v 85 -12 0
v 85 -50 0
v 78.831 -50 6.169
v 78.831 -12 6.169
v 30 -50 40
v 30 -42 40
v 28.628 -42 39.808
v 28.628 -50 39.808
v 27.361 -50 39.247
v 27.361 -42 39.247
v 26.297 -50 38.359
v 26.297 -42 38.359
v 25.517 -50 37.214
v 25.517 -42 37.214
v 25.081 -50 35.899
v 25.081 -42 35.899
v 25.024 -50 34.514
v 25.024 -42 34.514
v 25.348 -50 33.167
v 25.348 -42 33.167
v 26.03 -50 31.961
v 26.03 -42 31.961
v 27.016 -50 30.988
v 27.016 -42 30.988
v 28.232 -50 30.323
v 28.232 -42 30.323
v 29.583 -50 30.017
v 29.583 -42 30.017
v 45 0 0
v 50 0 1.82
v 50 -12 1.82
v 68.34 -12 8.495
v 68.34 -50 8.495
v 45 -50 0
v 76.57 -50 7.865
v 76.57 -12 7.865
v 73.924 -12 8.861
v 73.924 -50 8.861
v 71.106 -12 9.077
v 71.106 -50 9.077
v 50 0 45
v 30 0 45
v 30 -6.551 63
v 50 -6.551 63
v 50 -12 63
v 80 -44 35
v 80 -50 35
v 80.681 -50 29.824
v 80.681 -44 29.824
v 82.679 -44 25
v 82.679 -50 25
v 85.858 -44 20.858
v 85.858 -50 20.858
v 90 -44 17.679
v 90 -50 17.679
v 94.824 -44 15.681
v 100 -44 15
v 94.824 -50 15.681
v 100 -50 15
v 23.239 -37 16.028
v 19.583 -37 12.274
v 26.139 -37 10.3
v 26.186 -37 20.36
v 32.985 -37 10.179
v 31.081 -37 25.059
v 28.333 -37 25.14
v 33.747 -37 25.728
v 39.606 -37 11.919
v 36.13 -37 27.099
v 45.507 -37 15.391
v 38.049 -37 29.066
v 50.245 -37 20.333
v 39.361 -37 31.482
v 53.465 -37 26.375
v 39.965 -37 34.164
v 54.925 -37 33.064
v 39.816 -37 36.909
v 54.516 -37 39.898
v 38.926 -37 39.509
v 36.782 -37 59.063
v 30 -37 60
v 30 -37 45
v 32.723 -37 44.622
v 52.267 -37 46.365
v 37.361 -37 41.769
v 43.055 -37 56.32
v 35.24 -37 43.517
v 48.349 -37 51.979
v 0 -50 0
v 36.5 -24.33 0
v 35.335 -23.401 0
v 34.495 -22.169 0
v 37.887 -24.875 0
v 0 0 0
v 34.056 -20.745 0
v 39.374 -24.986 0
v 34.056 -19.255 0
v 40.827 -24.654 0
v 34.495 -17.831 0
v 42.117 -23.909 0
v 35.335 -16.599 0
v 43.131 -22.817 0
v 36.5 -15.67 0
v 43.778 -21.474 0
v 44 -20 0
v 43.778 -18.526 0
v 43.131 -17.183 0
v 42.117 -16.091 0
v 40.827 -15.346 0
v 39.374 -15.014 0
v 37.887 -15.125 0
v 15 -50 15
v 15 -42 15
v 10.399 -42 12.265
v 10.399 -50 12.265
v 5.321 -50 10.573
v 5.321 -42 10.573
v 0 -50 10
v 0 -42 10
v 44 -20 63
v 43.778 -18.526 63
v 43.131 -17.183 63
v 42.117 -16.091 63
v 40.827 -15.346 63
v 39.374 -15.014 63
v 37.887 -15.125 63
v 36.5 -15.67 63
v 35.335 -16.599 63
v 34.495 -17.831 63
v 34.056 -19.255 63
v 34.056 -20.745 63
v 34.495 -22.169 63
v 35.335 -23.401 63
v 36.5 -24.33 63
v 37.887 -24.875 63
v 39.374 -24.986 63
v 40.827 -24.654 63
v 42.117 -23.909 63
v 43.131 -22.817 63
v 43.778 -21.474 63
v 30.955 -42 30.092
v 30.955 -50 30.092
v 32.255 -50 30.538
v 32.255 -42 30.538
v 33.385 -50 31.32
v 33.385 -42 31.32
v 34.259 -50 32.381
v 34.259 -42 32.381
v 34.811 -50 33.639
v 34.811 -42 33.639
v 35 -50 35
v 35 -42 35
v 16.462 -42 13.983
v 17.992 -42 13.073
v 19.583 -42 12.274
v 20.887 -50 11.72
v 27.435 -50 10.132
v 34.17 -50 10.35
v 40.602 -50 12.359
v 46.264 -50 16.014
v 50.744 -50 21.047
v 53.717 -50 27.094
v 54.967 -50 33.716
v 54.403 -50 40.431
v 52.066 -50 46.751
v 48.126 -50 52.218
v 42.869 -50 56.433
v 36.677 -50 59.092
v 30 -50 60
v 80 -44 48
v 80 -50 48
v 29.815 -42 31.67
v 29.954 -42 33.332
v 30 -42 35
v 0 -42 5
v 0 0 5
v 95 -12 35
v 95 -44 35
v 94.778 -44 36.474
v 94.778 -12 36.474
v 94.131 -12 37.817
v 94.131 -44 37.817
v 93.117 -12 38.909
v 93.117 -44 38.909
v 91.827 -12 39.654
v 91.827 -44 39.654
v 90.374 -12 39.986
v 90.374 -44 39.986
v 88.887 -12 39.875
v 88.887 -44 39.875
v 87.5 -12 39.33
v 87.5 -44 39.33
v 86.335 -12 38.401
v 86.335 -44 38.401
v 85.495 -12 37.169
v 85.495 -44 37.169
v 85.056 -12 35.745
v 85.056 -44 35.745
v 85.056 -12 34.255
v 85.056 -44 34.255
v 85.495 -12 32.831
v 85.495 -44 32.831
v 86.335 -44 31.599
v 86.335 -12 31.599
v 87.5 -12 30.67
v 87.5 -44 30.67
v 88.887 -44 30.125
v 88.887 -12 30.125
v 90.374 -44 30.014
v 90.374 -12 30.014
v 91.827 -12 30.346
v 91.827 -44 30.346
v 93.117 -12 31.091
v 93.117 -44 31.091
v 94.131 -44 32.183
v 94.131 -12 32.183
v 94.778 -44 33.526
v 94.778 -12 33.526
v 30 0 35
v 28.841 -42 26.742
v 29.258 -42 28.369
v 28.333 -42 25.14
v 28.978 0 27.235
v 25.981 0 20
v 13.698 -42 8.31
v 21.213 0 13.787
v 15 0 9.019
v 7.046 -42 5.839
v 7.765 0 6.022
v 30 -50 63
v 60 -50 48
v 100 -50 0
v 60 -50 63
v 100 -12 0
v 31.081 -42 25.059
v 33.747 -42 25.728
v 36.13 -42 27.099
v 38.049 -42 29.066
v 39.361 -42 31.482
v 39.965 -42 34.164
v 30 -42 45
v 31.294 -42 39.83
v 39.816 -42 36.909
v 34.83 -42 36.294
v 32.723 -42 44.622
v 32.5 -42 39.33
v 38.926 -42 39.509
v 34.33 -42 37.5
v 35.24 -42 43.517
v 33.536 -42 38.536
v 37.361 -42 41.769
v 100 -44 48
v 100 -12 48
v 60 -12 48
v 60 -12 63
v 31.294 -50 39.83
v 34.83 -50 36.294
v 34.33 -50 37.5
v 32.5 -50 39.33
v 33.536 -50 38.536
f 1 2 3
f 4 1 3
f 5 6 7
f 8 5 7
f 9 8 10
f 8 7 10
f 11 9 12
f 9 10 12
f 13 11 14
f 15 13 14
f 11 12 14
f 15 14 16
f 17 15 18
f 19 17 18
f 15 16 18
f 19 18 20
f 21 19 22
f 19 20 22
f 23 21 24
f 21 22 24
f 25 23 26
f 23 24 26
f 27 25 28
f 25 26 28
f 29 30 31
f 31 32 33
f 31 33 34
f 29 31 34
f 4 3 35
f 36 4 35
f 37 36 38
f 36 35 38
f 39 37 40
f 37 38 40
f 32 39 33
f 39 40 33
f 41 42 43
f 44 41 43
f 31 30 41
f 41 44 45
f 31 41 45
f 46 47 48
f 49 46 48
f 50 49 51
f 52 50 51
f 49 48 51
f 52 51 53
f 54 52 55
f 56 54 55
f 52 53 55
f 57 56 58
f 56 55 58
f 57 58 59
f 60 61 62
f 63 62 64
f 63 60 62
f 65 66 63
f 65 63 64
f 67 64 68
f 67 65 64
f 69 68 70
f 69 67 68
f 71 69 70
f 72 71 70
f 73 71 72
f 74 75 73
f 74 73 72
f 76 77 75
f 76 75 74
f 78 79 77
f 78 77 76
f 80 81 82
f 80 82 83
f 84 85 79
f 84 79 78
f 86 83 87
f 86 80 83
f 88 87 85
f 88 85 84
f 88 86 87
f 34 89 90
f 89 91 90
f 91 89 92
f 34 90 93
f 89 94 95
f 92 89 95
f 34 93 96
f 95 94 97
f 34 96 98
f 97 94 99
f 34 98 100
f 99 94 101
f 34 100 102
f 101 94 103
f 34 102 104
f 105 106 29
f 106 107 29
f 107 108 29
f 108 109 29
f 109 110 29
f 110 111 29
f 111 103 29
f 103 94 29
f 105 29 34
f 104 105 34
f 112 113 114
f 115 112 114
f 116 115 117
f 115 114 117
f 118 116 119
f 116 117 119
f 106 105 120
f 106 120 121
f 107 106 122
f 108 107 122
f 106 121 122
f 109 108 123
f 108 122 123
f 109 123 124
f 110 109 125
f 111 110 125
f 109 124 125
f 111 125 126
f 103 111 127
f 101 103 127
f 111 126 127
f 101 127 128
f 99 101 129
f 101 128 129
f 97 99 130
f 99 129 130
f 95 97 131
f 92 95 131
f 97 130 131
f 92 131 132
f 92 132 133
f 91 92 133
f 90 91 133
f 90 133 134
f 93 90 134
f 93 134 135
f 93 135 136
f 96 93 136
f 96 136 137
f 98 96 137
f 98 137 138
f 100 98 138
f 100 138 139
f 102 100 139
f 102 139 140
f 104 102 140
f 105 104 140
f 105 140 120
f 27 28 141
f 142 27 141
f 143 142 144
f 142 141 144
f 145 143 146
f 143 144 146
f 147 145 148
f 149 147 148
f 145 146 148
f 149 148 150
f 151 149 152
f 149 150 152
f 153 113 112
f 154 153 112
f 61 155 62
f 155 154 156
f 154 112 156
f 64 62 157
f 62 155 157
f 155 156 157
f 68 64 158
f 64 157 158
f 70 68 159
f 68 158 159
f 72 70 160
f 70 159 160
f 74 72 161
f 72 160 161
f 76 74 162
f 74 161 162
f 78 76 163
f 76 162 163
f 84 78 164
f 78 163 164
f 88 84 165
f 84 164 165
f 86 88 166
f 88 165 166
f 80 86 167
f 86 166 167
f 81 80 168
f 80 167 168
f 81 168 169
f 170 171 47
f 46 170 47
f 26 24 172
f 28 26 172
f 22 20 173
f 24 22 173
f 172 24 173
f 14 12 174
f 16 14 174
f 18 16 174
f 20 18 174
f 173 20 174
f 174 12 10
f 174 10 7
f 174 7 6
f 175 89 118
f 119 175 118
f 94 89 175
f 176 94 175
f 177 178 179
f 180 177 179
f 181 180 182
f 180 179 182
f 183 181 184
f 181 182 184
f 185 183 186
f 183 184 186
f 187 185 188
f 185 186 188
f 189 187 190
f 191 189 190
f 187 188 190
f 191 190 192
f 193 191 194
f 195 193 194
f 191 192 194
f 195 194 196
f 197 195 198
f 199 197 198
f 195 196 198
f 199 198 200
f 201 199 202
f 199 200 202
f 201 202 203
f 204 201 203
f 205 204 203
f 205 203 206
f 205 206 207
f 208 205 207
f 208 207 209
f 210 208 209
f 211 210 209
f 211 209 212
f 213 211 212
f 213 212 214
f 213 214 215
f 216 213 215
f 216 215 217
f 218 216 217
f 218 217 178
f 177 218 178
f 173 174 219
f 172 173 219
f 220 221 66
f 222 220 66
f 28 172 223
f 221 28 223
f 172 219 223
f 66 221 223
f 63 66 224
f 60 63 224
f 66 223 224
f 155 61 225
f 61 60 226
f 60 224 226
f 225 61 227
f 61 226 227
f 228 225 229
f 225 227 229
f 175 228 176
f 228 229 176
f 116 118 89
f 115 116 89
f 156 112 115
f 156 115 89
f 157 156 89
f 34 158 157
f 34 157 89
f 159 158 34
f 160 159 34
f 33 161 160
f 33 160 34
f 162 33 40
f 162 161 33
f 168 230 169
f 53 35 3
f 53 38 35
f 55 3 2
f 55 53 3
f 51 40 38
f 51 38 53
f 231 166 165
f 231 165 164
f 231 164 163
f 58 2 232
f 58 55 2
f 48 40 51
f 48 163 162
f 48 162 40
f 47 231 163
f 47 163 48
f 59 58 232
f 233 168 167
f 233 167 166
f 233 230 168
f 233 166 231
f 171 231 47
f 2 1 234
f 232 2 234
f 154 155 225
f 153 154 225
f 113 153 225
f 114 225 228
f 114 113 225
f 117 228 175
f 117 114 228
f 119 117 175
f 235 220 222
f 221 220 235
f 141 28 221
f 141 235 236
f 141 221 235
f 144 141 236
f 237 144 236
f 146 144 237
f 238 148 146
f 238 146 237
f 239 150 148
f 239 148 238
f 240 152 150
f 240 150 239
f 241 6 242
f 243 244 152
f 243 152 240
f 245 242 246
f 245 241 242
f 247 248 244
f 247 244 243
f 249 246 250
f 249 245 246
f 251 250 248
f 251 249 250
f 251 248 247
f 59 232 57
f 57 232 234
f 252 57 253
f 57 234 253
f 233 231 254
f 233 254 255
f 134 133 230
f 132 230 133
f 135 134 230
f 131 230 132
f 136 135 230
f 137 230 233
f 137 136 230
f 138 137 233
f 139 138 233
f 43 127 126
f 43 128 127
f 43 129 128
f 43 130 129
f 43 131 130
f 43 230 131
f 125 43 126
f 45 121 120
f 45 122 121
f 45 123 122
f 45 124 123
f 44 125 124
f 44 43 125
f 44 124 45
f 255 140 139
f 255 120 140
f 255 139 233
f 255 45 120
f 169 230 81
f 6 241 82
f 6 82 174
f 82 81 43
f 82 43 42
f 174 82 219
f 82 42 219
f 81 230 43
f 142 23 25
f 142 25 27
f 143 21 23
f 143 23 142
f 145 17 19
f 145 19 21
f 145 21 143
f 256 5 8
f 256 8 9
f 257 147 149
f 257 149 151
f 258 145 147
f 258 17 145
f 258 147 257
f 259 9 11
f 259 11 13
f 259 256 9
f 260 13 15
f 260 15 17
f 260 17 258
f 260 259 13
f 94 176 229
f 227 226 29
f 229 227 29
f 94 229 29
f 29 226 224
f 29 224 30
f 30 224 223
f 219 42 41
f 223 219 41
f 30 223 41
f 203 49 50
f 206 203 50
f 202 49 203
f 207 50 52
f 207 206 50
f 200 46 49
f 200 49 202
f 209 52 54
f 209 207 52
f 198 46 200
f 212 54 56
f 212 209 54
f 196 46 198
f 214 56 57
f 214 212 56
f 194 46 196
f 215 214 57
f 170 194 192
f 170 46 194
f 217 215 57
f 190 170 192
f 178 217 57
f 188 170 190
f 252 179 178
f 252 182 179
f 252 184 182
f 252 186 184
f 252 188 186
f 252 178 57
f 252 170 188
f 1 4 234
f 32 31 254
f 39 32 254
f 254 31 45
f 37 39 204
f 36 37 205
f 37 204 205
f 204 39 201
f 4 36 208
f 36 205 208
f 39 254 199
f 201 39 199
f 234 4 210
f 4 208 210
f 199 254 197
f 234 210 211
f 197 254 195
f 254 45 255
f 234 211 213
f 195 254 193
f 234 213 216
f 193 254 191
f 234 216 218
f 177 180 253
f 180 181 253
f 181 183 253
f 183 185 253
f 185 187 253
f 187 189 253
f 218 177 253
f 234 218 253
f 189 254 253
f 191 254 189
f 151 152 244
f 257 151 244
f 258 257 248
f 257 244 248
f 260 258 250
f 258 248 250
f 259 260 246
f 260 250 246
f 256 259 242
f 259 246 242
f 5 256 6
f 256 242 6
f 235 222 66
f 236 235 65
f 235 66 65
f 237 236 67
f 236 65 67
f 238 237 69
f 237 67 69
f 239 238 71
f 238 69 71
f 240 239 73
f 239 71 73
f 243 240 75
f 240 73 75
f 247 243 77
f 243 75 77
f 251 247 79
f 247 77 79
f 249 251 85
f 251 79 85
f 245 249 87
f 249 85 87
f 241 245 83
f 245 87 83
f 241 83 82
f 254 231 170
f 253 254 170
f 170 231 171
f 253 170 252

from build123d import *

# Parameters (mm, degrees)
F0_W      = 100
F0_H      = 63
F1_DEPTH  = 50
F2_W      = 40
F2_H      = 15
F3_DEPTH  = 50.001
F5_DEPTH  = 6
F6_R      = 5
F7_DEPTH  = 44.001
F8_R      = 25
F9_DEPTH  = 13
F10_R     = 10
F11_DEPTH = 5
F13_DEPTH = 42
F15_DEPTH = 50.001
F17_DEPTH = 8
F19_DEPTH = 63.001
F20_R     = 5
F21_DEPTH = 63.001
F23_DEPTH = 70.001


with BuildPart() as f1:
    # F0 (on Front) → F1 (new body)
    with BuildSketch(Plane.XZ):
        with Locations((50, 31.5)):
            Rectangle(F0_W, F0_H)
    extrude(amount=F1_DEPTH)

    # F2 (on face) → F3 (cut, through all)
    with BuildSketch(Plane.XZ.offset(50)):
        with Locations((80, 55.5)):
            Rectangle(F2_W, F2_H)
        with BuildLine():
            Line((45, 0), (85, 0))
            Line((85, 0), (78.8309201782, 6.1690798218))
            ThreePointArc((78.8309201782, 6.1690798218), (73.9242485057, 8.8609720811), (68.3396509331, 8.4949382178))
            Line((68.3396509331, 8.4949382178), (45, 0))
        make_face()
    extrude(amount=-F3_DEPTH, mode=Mode.SUBTRACT)

    # F4 (on face) → F5 (cut)
    with BuildSketch(Plane.XZ.offset(50)):
        with BuildLine():
            Line((100, 48), (84.8013158464, 48))
            ThreePointArc((84.8013158464, 48), (81.2386876382, 41.9291527956), (80, 35))
            Line((80, 35), (100, 35))
            Line((100, 35), (100, 48))
        make_face()
        with BuildLine():
            ThreePointArc((80, 35), (81.2386876382, 41.9291527956), (84.8013158464, 48))
            Line((84.8013158464, 48), (80, 48))
            Line((80, 48), (80, 35))
        make_face()
        with BuildLine():
            ThreePointArc((80, 35), (85.8578643763, 20.8578643763), (100, 15))
            Line((100, 15), (100, 35))
            Line((100, 35), (80, 35))
        make_face()
    extrude(amount=-F5_DEPTH, mode=Mode.SUBTRACT)

    # F6 (on face) → F7 (cut, through all)
    with BuildSketch(Plane.XZ.offset(44)):
        with Locations((90, 35)):
            Circle(F6_R)
    extrude(amount=-F7_DEPTH, mode=Mode.SUBTRACT)

    # F8 (on face) → F9 (cut)
    with BuildSketch(Plane.XZ.offset(50)):
        with Locations((30, 35)):
            Circle(F8_R)
    extrude(amount=-F9_DEPTH, mode=Mode.SUBTRACT)

    # F10 (on face) → F11 (join)
    with BuildSketch(Plane.XZ.offset(37)):
        with Locations((30, 35)):
            Circle(F10_R)
    extrude(amount=F11_DEPTH)

    # F12 (on face) → F13 (cut)
    with BuildSketch(Plane(origin=(0, 0, 0), x_dir=(-1, 0, 0), z_dir=(0, 1, 0))):
        with BuildLine():
            ThreePointArc((-30, 35), (-24.7296369608, 51.9836702684), (-10.7703296143, 63))
            Line((-10.7703296143, 63), (-30, 63))
            Line((-30, 63), (-30, 35))
        make_face()
        with BuildLine():
            Line((0, 63), (-10.7703296143, 63))
            ThreePointArc((-10.7703296143, 63), (-24.7296369608, 51.9836702684), (-30, 35))
            Line((-30, 35), (0, 35))
            Line((0, 35), (0, 63))
        make_face()
        with BuildLine():
            ThreePointArc((-30, 35), (-21.2132034356, 13.7867965644), (0, 5))
            Line((0, 5), (0, 35))
            Line((0, 35), (-30, 35))
        make_face()
    extrude(amount=-F13_DEPTH, mode=Mode.SUBTRACT)

    # F14 (on face) → F15 (cut, through all)
    with BuildSketch(Plane(origin=(0, 0, 0), x_dir=(-1, 0, 0), z_dir=(0, 1, 0))):
        with BuildLine():
            ThreePointArc((0, 10), (17.6776695297, 17.3223304703), (25, 35))
            ThreePointArc((25, 35), (17.6776695297, 52.6776695297), (0, 60))
            Line((0, 60), (0, 35))
            Line((0, 35), (0, 10))
        make_face()
        with BuildLine():
            Line((0, 35), (0, 60))
            ThreePointArc((0, 60), (-17.6776695297, 52.6776695297), (-25, 35))
            Line((-25, 35), (0, 35))
        make_face()
        with BuildLine():
            ThreePointArc((-25, 35), (-17.6776695297, 52.6776695297), (0, 60))
            Line((0, 60), (0, 63))
            Line((0, 63), (-30, 63))
            Line((-30, 63), (-30, 35))
            Line((-30, 35), (-25, 35))
        make_face()
        with BuildLine():
            ThreePointArc((-25, 35), (-17.6776695297, 17.3223304703), (0, 10))
            Line((0, 10), (0, 35))
            Line((0, 35), (-25, 35))
        make_face()
    extrude(amount=-F15_DEPTH, mode=Mode.SUBTRACT)

    # F16 (on face) → F17 (join, through all)
    with BuildSketch(Plane.XZ.offset(42)):
        with BuildLine():
            Line((30, 35), (30, 40))
            ThreePointArc((30, 40), (25.0043497313, 35.2085147299), (29.5833333333, 30.017391357))
            ThreePointArc((29.5833333333, 30.017391357), (29.8956518578, 32.5), (30, 35))
        make_face()
        with BuildLine():
            ThreePointArc((29.5833333333, 30.017391357), (33.3850160019, 31.320099639), (35, 35))
            ThreePointArc((35, 35), (33.5355339059, 38.5355339059), (30, 40))
            Line((30, 40), (30, 35))
            ThreePointArc((30, 35), (29.8956518578, 32.5), (29.5833333333, 30.017391357))
        make_face()
    extrude(amount=F17_DEPTH)

    # F18 (on face) → F19 (cut, through all)
    with BuildSketch(Plane.XY.offset(63)):
        Polygon((100, -12), (100, 0), (60, 0), (50, 0), (50, -12), align=None)
    extrude(amount=-F19_DEPTH, mode=Mode.SUBTRACT)

    # F20 (on face) → F21 (cut, through all)
    with BuildSketch(Plane.XY.offset(63)):
        with Locations((39, -20)):
            Circle(F20_R)
    extrude(amount=-F21_DEPTH, mode=Mode.SUBTRACT)

    # F22 (on face) → F23 (cut, through all)
    with BuildSketch(Plane(origin=(30, 0, 0), x_dir=(0, -1, 0), z_dir=(-1, 0, 0))):
        Polygon((6.5514642168, 63), (0, 63), (0, 45), align=None)
    extrude(amount=-F23_DEPTH, mode=Mode.SUBTRACT)


solid = f1.part
